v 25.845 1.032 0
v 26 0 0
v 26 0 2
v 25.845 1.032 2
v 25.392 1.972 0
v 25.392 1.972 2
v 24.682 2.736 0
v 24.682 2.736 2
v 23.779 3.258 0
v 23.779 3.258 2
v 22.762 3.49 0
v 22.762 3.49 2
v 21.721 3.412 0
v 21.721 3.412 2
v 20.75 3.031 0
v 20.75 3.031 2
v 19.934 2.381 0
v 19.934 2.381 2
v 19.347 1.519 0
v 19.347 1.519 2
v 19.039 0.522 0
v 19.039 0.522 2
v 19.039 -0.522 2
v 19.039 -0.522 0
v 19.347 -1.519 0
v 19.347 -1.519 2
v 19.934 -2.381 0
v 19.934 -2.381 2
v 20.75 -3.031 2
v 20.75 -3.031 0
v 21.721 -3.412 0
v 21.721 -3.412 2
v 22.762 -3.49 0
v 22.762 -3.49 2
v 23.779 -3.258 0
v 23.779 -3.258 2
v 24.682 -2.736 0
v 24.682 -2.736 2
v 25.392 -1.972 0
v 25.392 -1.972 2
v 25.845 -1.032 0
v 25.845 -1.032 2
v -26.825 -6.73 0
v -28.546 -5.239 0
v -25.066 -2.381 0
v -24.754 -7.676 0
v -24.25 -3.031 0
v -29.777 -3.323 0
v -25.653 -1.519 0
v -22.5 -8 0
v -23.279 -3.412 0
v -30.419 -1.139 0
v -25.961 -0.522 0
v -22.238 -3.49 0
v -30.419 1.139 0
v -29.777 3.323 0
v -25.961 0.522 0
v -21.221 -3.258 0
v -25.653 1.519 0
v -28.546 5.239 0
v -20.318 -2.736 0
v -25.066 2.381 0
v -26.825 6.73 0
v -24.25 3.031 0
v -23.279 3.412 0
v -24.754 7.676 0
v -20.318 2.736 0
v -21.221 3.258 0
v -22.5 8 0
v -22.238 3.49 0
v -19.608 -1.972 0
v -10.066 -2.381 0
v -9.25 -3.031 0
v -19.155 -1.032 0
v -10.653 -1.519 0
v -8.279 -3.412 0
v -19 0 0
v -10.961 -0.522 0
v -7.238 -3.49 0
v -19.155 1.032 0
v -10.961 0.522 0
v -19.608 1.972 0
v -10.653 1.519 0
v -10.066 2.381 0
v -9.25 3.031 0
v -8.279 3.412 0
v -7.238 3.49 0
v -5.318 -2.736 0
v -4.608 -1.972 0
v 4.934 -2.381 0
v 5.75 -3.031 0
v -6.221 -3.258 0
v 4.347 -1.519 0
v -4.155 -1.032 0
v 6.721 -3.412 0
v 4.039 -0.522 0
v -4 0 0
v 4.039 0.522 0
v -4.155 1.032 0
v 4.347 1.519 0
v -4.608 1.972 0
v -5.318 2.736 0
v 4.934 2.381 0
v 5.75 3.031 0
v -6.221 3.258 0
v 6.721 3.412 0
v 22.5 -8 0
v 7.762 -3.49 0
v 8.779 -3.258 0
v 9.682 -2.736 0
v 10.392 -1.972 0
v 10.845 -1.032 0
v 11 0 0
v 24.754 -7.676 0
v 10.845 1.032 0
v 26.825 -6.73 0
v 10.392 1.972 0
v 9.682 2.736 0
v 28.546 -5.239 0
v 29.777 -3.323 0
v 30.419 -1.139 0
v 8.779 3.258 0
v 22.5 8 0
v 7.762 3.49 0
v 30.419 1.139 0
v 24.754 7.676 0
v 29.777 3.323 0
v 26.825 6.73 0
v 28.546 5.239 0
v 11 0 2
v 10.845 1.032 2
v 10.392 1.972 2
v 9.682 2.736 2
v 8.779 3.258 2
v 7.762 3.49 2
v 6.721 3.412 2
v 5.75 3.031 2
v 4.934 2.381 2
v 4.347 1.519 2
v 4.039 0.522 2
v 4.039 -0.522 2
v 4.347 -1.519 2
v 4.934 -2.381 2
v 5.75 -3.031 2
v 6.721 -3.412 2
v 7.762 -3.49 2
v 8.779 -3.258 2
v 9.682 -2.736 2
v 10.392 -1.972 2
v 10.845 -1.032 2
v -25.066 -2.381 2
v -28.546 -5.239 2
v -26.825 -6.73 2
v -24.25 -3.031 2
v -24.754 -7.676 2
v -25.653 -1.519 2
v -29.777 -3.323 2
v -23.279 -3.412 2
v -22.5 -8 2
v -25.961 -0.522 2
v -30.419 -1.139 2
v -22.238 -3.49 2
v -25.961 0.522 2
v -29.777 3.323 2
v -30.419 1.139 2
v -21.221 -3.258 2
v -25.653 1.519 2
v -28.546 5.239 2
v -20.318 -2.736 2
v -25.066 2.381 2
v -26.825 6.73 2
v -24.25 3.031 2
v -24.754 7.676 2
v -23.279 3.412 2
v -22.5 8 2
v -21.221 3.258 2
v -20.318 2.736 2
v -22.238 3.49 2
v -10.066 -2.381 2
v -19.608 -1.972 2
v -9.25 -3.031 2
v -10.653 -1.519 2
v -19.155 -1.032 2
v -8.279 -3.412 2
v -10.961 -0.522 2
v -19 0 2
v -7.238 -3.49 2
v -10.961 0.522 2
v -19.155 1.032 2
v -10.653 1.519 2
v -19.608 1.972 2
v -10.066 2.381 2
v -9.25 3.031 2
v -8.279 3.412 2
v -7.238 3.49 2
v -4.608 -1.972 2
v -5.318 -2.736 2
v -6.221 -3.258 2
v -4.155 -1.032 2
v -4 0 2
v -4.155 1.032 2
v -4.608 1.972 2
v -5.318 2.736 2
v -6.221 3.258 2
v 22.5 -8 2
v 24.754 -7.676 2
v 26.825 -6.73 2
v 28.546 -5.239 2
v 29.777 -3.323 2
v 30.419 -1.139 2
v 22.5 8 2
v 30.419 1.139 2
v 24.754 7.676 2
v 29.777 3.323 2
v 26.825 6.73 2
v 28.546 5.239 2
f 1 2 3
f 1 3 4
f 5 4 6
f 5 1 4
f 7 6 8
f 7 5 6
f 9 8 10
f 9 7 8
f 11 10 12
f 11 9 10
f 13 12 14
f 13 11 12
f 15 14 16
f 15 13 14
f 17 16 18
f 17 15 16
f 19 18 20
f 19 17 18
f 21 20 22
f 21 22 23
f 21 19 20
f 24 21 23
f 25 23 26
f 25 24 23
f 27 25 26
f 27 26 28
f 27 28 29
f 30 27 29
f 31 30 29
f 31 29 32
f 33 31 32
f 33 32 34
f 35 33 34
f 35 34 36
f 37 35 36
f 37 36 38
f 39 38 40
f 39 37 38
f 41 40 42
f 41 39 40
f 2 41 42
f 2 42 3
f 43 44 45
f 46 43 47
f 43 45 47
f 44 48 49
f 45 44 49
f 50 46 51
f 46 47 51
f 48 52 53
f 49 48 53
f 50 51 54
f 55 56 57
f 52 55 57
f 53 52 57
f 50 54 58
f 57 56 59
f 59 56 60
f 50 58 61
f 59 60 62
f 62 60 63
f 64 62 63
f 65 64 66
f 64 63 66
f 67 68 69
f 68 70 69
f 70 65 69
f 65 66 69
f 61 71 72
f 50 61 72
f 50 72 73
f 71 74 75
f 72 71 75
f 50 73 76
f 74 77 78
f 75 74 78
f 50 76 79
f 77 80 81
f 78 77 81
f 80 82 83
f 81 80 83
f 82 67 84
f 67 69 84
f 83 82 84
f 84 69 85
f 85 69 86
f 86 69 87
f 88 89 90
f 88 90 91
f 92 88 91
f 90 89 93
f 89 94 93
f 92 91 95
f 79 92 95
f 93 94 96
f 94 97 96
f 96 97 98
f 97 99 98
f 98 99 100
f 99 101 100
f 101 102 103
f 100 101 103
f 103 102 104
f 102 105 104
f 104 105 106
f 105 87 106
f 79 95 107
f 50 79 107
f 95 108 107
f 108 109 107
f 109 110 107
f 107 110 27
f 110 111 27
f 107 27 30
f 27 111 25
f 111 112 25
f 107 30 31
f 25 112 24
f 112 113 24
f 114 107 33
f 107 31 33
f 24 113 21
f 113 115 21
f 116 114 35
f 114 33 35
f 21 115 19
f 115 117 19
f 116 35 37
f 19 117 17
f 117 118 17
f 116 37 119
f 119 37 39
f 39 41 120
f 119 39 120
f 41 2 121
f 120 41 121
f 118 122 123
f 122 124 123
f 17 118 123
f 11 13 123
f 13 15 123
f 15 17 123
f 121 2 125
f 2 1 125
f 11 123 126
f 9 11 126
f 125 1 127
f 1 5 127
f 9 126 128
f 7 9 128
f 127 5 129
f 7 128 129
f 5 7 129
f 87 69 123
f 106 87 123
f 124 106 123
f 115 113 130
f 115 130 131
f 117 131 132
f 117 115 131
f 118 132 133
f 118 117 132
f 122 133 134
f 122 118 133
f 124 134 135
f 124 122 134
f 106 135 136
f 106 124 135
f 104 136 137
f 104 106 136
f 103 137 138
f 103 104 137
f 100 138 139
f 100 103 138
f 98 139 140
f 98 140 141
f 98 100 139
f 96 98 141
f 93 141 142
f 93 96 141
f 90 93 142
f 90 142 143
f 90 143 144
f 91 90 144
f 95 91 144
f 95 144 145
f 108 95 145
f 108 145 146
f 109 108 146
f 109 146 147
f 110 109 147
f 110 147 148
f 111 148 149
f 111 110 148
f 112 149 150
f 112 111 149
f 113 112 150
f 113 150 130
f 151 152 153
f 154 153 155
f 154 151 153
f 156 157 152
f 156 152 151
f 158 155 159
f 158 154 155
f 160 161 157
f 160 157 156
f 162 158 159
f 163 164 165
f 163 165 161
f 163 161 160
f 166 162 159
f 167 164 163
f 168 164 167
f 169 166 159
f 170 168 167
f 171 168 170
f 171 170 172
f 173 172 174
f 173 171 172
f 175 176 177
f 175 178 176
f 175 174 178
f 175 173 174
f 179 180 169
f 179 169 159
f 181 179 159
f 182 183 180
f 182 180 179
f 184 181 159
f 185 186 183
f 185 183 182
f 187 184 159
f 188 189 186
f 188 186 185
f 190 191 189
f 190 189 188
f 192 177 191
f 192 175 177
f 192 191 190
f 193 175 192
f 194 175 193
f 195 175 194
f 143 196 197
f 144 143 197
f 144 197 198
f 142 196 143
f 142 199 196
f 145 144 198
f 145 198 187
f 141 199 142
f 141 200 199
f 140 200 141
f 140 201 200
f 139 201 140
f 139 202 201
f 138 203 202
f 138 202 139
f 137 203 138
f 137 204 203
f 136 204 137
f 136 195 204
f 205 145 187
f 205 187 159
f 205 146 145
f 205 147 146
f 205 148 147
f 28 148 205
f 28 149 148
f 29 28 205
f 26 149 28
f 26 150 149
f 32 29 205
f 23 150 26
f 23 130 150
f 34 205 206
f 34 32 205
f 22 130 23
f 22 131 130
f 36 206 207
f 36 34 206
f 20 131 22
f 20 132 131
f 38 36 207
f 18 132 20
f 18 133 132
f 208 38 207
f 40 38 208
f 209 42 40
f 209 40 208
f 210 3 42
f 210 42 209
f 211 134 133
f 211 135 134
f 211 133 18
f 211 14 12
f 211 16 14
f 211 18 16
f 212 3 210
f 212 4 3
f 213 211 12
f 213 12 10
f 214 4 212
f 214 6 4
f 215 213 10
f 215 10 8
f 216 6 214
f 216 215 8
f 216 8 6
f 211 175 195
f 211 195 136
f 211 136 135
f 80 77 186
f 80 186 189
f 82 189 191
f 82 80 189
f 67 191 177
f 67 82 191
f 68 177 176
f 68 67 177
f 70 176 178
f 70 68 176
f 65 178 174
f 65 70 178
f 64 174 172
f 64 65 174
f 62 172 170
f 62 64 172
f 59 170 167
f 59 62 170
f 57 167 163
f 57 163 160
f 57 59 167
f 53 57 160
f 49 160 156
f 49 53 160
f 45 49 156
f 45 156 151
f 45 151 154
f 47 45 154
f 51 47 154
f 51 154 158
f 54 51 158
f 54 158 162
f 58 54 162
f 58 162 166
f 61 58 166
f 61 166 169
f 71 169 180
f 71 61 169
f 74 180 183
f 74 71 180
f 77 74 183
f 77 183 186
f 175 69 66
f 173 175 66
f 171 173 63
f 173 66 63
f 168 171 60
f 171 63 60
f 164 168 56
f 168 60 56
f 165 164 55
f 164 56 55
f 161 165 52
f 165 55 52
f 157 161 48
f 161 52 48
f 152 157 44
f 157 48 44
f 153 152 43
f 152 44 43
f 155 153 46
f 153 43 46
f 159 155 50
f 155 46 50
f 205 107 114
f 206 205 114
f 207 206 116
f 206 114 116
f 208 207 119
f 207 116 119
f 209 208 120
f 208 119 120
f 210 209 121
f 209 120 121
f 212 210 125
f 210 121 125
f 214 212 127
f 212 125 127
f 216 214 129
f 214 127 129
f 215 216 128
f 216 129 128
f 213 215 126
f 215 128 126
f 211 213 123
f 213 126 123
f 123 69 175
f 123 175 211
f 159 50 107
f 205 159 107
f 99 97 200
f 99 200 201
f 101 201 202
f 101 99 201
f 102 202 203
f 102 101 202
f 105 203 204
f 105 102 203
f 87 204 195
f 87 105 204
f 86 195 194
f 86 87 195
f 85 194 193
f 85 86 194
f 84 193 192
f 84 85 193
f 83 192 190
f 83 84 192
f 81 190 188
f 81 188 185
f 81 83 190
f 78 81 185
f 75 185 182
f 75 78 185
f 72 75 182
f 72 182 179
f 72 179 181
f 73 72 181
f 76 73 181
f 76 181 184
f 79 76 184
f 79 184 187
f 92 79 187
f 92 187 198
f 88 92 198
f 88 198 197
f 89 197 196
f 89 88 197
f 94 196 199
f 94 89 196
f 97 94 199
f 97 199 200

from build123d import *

# Parameters (mm, degrees)
SKETCH_R  = 3.5
PAD_DEPTH = 2


with BuildPart() as part:
    # Sketch → Pad (new body)
    with BuildSketch(Plane.XY):
        with BuildLine():
            ThreePointArc((-22.5, 8), (-30.5, 0), (-22.5, -8))
            Line((-22.5, -8), (22.5, -8))
            ThreePointArc((22.5, -8), (30.5, 0), (22.5, 8))
            Line((-22.5, 8), (22.5, 8))
        make_face()
        with Locations((-22.5, 0)):
            Circle(SKETCH_R, mode=Mode.SUBTRACT)
        with Locations((22.5, 0)):
            Circle(SKETCH_R, mode=Mode.SUBTRACT)
        with Locations((-7.5, 0)):
            Circle(SKETCH_R, mode=Mode.SUBTRACT)
        with Locations((7.5, 0)):
            Circle(SKETCH_R, mode=Mode.SUBTRACT)
    extrude(amount=PAD_DEPTH)


solid = part.part
